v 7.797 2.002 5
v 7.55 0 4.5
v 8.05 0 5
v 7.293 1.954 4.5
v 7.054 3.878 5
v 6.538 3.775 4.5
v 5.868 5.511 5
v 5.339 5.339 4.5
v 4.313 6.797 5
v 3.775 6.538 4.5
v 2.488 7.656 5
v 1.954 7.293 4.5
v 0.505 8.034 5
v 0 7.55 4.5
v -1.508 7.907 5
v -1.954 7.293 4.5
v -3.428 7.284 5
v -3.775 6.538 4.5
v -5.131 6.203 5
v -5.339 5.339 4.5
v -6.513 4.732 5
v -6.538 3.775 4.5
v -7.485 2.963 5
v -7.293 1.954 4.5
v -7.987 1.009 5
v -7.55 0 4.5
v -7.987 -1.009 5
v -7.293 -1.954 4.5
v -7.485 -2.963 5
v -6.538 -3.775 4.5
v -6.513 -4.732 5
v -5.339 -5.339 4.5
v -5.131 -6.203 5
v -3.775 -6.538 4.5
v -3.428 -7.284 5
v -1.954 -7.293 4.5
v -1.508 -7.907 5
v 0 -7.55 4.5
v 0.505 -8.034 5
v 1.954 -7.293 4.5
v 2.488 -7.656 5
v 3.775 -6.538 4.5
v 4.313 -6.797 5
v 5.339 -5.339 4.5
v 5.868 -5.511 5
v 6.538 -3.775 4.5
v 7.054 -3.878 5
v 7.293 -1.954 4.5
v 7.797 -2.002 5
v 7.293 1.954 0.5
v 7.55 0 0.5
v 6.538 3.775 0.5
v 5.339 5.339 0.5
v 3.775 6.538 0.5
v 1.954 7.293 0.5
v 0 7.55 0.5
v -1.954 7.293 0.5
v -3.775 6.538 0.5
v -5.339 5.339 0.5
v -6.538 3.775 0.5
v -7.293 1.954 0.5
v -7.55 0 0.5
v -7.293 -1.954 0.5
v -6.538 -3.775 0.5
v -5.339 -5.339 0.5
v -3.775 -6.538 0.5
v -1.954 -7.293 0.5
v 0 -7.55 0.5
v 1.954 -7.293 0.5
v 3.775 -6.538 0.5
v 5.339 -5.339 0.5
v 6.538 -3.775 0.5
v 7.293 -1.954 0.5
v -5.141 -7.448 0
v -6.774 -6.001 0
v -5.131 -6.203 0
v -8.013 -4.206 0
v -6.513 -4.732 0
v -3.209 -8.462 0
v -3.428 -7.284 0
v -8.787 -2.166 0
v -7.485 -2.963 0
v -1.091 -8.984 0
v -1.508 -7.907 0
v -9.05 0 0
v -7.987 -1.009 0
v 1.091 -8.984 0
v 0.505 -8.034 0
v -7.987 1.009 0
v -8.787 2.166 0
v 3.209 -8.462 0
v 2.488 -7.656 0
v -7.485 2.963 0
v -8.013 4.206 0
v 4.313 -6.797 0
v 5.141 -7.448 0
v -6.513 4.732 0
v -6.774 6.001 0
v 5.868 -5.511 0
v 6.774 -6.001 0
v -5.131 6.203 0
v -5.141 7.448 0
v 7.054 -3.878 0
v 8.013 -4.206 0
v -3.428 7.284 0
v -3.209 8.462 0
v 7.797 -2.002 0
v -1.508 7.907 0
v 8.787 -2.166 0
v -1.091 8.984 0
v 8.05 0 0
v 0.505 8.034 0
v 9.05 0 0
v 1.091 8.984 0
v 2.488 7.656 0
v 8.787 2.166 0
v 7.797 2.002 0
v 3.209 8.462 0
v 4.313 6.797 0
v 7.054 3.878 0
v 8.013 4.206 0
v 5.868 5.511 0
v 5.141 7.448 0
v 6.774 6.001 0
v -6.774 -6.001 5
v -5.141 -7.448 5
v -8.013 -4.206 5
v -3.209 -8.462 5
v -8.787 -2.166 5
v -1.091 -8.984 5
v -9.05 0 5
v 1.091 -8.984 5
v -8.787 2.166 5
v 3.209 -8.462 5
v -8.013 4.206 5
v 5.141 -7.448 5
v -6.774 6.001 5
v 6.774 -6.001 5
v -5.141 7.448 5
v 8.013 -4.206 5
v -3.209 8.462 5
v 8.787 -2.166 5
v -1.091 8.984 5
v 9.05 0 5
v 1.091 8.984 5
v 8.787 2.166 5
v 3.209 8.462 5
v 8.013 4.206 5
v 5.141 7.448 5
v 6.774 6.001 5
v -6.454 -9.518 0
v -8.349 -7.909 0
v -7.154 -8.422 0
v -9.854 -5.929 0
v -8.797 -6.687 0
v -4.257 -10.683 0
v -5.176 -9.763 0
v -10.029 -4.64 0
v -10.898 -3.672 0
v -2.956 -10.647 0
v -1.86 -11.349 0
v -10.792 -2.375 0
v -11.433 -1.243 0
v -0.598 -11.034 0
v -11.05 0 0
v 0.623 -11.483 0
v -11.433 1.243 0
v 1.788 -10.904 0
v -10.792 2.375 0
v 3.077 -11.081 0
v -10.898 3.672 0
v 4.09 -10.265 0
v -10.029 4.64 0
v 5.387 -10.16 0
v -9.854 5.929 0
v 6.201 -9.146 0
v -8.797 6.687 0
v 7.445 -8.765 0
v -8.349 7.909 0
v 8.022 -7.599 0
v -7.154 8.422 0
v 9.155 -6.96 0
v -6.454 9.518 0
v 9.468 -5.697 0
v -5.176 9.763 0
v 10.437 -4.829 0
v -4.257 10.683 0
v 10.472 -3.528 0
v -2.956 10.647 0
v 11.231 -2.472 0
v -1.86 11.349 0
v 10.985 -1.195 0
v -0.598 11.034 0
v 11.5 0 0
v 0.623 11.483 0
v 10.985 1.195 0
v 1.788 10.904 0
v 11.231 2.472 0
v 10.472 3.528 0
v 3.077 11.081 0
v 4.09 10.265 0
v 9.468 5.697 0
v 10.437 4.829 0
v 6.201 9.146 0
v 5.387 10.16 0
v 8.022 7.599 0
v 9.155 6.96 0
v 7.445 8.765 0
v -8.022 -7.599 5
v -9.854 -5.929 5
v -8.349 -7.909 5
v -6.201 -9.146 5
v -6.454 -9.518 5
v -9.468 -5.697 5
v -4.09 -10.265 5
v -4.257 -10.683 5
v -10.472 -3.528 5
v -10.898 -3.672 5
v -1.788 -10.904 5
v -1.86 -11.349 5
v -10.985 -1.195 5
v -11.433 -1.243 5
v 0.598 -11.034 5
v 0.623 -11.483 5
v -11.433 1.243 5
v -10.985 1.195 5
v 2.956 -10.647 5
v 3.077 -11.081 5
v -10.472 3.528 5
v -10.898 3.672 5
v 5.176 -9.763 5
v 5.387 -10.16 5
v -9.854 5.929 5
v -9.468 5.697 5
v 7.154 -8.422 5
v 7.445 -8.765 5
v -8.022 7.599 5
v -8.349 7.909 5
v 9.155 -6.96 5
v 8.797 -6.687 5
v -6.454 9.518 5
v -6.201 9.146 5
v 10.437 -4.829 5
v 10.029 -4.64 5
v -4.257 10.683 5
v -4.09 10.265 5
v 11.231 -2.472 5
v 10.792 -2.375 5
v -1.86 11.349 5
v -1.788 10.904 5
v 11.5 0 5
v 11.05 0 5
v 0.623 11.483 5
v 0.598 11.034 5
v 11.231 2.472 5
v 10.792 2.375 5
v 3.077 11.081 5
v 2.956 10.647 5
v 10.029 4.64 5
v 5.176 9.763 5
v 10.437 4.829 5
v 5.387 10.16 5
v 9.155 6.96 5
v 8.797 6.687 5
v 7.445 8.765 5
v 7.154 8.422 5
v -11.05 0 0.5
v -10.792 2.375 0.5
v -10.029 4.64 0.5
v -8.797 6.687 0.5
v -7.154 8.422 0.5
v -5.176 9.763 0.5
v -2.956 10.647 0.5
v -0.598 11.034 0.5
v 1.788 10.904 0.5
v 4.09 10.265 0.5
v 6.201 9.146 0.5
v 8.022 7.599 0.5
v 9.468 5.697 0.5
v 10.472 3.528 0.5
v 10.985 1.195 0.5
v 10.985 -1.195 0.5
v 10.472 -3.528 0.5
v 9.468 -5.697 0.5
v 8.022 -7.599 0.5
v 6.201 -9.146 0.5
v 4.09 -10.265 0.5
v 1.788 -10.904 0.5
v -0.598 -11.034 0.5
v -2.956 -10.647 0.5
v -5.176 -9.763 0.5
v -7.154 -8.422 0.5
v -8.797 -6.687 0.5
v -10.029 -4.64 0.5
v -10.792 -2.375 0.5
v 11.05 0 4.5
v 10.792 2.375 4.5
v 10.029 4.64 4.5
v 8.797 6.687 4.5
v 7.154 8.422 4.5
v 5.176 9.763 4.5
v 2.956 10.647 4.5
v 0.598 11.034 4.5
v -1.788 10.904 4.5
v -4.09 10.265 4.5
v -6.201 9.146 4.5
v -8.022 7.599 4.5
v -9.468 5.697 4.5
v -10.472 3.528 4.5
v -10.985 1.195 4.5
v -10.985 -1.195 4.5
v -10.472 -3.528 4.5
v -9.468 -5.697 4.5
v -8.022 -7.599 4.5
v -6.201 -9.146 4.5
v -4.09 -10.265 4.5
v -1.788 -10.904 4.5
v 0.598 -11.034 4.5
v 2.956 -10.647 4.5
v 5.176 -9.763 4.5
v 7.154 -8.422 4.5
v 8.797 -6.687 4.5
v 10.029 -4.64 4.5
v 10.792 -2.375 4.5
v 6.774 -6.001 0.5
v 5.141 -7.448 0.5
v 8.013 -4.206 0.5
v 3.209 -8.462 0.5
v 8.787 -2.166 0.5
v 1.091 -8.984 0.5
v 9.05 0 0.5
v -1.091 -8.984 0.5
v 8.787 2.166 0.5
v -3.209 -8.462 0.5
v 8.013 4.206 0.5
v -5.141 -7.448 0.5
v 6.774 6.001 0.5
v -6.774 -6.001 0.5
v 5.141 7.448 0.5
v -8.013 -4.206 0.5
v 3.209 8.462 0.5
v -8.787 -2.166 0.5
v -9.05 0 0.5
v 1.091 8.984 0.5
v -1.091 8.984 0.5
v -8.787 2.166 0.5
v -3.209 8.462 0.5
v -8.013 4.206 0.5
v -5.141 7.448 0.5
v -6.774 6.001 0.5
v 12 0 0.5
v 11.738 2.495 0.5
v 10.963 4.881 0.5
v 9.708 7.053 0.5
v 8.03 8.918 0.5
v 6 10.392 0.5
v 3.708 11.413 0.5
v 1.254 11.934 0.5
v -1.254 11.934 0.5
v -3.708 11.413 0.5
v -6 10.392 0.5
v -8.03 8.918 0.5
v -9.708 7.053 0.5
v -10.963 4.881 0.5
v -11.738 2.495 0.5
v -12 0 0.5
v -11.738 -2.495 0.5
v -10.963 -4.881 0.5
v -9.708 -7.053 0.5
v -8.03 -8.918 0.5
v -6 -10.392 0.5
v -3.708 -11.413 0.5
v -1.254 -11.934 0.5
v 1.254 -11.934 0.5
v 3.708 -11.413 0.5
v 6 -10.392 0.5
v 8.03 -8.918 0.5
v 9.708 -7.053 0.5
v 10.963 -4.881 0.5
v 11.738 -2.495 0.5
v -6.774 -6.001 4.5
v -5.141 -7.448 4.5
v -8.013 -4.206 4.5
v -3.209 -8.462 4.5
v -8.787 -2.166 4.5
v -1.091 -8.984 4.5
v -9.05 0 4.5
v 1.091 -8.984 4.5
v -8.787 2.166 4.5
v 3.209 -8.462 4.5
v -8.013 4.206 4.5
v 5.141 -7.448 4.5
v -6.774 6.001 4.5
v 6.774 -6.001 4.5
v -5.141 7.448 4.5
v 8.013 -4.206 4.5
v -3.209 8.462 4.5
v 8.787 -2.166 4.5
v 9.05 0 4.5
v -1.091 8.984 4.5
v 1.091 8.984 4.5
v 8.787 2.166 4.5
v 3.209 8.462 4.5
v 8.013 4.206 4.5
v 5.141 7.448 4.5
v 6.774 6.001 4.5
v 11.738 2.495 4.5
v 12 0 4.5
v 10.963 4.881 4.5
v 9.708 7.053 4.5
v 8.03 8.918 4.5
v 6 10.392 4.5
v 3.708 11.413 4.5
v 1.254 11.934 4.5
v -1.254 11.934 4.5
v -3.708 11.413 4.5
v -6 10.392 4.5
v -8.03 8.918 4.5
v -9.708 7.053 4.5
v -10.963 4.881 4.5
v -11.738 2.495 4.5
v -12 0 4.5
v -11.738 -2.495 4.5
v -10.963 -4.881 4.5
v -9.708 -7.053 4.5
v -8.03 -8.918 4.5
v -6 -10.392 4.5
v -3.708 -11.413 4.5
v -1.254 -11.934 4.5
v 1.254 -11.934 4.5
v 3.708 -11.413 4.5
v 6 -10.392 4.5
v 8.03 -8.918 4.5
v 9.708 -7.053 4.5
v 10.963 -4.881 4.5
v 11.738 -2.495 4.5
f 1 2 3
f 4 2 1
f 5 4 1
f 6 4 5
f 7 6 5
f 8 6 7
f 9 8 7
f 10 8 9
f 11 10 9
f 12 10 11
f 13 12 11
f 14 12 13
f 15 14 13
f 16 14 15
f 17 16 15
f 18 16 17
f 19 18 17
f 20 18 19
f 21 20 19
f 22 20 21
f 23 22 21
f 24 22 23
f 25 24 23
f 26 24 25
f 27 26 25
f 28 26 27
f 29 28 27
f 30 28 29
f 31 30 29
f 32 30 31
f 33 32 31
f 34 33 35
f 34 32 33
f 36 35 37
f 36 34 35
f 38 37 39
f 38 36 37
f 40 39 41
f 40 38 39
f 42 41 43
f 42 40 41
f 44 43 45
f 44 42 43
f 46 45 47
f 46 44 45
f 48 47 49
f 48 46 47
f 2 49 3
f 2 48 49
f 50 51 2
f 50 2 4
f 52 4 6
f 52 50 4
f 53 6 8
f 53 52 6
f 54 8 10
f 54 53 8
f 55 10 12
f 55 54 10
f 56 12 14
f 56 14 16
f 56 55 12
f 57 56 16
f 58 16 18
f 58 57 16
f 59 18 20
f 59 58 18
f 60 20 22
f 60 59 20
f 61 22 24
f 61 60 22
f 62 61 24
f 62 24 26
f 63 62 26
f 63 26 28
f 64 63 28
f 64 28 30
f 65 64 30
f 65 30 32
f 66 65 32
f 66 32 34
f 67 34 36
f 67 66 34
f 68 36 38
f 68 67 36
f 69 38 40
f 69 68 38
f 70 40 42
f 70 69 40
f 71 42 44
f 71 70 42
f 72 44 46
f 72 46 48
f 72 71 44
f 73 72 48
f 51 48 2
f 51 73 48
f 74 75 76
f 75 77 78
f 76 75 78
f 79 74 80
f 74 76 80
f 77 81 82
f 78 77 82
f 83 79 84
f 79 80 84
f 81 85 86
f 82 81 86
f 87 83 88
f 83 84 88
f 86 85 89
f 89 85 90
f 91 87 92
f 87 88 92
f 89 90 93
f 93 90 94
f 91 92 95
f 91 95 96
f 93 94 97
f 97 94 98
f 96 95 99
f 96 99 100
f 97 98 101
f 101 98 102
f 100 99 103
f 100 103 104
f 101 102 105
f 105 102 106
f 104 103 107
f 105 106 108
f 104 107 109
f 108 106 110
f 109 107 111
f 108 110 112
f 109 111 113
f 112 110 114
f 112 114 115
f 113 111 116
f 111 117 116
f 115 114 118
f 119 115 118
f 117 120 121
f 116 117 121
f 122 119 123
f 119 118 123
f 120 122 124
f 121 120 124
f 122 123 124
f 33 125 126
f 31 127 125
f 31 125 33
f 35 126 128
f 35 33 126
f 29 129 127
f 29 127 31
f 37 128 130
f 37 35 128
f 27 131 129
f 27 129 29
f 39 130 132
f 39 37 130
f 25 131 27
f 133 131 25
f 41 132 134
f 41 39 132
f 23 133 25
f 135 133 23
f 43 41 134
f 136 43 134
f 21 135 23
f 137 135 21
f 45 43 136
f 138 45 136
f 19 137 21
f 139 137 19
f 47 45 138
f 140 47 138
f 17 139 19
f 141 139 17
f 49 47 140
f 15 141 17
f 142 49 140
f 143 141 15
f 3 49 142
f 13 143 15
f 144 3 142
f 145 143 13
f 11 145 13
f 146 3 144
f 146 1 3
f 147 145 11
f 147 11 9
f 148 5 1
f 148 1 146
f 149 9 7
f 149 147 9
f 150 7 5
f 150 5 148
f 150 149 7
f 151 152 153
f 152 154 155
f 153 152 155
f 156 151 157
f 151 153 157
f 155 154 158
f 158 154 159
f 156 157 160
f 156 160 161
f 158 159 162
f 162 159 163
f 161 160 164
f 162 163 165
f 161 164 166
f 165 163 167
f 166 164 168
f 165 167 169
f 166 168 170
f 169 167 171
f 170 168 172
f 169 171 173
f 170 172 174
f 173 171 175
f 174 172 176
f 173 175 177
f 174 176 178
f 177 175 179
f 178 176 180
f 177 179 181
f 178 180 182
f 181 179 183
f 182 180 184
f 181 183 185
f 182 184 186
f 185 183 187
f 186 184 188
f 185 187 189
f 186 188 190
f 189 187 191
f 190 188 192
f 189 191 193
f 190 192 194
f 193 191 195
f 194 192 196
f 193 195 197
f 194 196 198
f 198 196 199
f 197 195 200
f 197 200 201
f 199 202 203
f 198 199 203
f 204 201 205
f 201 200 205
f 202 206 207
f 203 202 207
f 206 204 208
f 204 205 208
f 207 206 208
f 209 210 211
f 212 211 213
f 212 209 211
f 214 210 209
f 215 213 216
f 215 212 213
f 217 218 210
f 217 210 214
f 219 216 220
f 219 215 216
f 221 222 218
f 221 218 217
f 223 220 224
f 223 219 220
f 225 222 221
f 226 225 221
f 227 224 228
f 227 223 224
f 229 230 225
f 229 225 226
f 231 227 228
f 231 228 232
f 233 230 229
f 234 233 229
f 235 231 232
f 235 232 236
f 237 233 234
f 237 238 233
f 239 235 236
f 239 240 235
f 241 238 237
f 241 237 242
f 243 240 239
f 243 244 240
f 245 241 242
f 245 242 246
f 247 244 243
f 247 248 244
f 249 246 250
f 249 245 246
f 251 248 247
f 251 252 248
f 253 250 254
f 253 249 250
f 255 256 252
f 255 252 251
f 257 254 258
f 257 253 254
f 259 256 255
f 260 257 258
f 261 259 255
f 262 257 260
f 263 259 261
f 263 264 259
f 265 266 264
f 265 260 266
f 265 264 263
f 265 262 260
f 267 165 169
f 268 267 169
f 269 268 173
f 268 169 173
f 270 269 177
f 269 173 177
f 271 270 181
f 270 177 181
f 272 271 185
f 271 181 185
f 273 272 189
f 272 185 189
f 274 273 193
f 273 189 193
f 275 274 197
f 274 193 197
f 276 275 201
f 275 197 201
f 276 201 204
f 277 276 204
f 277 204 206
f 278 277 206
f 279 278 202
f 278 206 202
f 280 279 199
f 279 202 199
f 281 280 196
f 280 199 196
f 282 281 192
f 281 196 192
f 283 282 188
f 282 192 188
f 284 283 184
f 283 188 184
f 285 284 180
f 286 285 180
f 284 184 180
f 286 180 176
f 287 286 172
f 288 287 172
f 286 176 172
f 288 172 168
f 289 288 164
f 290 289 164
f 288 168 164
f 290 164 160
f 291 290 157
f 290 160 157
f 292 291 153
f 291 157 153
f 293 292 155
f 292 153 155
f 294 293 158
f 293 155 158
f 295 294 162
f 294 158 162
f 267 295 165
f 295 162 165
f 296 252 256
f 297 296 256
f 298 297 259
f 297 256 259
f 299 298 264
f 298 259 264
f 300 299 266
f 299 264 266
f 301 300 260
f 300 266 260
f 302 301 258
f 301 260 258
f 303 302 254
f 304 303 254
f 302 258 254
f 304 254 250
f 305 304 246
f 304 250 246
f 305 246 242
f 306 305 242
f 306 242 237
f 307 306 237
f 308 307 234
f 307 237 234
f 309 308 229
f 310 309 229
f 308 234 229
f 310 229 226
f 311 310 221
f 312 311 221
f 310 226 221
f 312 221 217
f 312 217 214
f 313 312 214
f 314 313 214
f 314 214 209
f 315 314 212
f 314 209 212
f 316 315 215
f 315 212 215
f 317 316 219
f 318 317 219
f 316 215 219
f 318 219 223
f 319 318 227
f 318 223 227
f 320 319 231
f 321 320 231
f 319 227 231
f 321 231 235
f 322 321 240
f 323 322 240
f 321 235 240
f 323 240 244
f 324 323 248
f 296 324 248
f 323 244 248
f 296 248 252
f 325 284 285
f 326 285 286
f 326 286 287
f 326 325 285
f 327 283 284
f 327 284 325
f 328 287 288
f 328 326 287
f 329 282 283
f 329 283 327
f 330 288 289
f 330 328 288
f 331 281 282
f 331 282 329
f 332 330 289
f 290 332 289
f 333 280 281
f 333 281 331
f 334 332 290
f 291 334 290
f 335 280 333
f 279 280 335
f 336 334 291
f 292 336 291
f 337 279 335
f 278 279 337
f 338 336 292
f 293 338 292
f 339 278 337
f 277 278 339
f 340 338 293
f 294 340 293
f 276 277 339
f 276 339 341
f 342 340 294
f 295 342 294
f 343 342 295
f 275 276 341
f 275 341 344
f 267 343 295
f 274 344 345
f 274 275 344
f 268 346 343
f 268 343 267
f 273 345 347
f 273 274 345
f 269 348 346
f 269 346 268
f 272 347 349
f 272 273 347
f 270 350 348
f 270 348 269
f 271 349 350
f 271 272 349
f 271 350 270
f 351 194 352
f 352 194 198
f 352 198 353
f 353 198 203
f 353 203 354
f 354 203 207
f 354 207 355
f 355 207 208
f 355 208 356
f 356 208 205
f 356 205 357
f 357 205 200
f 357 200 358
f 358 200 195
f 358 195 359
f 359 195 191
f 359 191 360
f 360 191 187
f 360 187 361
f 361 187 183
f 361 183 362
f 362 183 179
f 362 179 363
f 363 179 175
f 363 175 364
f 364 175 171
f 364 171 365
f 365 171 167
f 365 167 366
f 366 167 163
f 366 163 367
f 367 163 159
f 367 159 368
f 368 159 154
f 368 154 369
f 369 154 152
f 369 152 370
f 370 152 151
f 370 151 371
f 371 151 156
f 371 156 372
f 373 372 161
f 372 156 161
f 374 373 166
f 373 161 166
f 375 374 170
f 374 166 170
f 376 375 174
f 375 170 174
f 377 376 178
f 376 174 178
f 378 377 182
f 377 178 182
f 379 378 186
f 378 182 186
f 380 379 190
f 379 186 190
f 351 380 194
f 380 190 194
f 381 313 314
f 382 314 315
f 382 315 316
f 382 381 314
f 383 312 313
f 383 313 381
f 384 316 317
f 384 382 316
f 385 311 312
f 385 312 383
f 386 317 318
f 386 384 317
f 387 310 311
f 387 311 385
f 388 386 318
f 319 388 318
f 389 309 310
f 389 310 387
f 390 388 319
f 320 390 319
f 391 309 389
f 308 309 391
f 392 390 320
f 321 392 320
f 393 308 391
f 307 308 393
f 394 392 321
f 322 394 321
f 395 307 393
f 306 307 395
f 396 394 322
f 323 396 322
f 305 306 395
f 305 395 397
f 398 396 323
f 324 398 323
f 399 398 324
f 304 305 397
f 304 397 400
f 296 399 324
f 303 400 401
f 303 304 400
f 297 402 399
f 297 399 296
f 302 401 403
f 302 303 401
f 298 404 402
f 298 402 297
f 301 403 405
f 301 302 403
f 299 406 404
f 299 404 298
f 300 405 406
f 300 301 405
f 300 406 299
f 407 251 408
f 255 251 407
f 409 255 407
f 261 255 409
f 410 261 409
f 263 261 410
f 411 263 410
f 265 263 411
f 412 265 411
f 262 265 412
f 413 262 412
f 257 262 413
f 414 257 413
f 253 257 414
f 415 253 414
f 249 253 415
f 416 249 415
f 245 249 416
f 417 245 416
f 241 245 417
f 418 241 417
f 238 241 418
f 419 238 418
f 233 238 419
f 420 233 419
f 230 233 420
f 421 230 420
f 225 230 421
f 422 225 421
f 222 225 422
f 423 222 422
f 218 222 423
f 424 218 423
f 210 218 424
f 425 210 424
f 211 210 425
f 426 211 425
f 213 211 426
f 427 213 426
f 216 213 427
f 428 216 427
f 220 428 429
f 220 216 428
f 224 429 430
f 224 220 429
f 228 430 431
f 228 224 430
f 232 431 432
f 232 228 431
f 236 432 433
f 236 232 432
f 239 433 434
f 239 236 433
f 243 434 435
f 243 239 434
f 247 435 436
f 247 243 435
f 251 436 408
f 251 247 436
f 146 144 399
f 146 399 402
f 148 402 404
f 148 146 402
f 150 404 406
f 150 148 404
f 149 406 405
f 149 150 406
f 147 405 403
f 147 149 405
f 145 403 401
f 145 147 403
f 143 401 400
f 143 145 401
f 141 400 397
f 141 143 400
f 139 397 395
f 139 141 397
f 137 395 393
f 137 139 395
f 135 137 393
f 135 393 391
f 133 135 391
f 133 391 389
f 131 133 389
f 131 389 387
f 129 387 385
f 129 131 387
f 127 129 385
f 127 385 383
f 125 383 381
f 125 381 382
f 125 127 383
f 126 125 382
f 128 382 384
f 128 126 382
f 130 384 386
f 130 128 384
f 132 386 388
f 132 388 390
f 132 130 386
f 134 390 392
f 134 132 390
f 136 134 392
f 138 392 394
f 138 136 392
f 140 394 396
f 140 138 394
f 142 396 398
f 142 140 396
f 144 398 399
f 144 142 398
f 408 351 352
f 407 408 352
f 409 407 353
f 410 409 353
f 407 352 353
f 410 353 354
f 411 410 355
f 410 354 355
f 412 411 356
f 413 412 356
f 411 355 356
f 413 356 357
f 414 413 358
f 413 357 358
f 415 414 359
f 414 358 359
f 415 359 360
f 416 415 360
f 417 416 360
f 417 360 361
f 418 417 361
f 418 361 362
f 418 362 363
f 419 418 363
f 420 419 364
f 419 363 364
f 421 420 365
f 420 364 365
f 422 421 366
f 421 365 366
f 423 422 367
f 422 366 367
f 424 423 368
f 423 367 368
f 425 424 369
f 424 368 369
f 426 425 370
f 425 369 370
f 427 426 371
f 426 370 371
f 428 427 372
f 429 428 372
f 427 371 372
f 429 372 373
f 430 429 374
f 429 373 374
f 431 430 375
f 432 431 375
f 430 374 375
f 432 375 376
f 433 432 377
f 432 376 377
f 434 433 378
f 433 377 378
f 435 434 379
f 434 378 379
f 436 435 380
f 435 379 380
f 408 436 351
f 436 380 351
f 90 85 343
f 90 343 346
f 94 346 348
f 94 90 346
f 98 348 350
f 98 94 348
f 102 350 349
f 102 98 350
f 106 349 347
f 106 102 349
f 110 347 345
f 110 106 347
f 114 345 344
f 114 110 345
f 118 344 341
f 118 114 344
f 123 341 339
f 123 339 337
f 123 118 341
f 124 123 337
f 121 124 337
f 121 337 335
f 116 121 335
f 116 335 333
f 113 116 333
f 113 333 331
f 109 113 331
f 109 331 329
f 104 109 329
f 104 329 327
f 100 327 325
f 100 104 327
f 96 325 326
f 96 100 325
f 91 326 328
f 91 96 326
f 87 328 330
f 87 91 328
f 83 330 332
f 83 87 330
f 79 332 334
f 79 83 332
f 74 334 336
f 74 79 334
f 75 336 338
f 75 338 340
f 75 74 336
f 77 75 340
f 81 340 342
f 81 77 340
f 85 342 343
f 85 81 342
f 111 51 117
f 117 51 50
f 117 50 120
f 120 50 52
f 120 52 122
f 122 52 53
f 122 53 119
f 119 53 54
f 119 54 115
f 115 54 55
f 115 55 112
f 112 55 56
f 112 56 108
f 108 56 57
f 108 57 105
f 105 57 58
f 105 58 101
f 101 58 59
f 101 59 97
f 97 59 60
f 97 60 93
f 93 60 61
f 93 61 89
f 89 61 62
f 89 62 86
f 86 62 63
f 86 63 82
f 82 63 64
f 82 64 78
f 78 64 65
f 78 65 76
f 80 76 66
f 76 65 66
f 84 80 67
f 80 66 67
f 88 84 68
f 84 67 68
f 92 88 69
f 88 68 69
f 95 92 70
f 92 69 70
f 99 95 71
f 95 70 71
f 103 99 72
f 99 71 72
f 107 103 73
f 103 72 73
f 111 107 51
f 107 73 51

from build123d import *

# Parameters (mm, degrees)
ESBO_O1_R                = 12
ESBO_O1_R_2              = 7.55
RESSALTO_EXTRUS_O1_DEPTH = 5
ESBO_O2_R                = 11.05
ESBO_O2_R_2              = 9.05
CORTE_EXTRUS_O1_DEPTH    = 0.5
ESBO_O3_R                = 11.05
ESBO_O3_R_2              = 9.05
CORTE_EXTRUS_O2_DEPTH    = 0.5
CHANFRO1_SIZE            = 0.5


with BuildPart() as part:
    # Esboço1 → Ressalto-extrusão1 (new body)
    with BuildSketch(Plane.XY):
        Circle(ESBO_O1_R)
        Circle(ESBO_O1_R_2, mode=Mode.SUBTRACT)
    extrude(amount=RESSALTO_EXTRUS_O1_DEPTH)

    # Esboço2 → Corte-extrusão1 (cut)
    with BuildSketch(Plane.XY.offset(5)):
        Circle(ESBO_O2_R)
        Circle(ESBO_O2_R_2, mode=Mode.SUBTRACT)
    extrude(amount=-CORTE_EXTRUS_O1_DEPTH, mode=Mode.SUBTRACT)

    # Esboço3 → Corte-extrusão2 (cut)
    with BuildSketch(Plane(origin=(0, 0, 0), x_dir=(-1, 0, 0), z_dir=(0, 0, -1))):
        Circle(ESBO_O3_R)
        Circle(ESBO_O3_R_2, mode=Mode.SUBTRACT)
    extrude(amount=-CORTE_EXTRUS_O2_DEPTH, mode=Mode.SUBTRACT)

    # Chanfro1
    chanfro1_edges = [part.edges().sort_by_distance(p)[0] for p in [
        (-12, 0, 0),
        (-12, 0, 5),
        (-7.55, 0, 0),
        (-7.55, 0, 5),
    ]]
    chamfer(chanfro1_edges, length=CHANFRO1_SIZE)


solid = part.part
